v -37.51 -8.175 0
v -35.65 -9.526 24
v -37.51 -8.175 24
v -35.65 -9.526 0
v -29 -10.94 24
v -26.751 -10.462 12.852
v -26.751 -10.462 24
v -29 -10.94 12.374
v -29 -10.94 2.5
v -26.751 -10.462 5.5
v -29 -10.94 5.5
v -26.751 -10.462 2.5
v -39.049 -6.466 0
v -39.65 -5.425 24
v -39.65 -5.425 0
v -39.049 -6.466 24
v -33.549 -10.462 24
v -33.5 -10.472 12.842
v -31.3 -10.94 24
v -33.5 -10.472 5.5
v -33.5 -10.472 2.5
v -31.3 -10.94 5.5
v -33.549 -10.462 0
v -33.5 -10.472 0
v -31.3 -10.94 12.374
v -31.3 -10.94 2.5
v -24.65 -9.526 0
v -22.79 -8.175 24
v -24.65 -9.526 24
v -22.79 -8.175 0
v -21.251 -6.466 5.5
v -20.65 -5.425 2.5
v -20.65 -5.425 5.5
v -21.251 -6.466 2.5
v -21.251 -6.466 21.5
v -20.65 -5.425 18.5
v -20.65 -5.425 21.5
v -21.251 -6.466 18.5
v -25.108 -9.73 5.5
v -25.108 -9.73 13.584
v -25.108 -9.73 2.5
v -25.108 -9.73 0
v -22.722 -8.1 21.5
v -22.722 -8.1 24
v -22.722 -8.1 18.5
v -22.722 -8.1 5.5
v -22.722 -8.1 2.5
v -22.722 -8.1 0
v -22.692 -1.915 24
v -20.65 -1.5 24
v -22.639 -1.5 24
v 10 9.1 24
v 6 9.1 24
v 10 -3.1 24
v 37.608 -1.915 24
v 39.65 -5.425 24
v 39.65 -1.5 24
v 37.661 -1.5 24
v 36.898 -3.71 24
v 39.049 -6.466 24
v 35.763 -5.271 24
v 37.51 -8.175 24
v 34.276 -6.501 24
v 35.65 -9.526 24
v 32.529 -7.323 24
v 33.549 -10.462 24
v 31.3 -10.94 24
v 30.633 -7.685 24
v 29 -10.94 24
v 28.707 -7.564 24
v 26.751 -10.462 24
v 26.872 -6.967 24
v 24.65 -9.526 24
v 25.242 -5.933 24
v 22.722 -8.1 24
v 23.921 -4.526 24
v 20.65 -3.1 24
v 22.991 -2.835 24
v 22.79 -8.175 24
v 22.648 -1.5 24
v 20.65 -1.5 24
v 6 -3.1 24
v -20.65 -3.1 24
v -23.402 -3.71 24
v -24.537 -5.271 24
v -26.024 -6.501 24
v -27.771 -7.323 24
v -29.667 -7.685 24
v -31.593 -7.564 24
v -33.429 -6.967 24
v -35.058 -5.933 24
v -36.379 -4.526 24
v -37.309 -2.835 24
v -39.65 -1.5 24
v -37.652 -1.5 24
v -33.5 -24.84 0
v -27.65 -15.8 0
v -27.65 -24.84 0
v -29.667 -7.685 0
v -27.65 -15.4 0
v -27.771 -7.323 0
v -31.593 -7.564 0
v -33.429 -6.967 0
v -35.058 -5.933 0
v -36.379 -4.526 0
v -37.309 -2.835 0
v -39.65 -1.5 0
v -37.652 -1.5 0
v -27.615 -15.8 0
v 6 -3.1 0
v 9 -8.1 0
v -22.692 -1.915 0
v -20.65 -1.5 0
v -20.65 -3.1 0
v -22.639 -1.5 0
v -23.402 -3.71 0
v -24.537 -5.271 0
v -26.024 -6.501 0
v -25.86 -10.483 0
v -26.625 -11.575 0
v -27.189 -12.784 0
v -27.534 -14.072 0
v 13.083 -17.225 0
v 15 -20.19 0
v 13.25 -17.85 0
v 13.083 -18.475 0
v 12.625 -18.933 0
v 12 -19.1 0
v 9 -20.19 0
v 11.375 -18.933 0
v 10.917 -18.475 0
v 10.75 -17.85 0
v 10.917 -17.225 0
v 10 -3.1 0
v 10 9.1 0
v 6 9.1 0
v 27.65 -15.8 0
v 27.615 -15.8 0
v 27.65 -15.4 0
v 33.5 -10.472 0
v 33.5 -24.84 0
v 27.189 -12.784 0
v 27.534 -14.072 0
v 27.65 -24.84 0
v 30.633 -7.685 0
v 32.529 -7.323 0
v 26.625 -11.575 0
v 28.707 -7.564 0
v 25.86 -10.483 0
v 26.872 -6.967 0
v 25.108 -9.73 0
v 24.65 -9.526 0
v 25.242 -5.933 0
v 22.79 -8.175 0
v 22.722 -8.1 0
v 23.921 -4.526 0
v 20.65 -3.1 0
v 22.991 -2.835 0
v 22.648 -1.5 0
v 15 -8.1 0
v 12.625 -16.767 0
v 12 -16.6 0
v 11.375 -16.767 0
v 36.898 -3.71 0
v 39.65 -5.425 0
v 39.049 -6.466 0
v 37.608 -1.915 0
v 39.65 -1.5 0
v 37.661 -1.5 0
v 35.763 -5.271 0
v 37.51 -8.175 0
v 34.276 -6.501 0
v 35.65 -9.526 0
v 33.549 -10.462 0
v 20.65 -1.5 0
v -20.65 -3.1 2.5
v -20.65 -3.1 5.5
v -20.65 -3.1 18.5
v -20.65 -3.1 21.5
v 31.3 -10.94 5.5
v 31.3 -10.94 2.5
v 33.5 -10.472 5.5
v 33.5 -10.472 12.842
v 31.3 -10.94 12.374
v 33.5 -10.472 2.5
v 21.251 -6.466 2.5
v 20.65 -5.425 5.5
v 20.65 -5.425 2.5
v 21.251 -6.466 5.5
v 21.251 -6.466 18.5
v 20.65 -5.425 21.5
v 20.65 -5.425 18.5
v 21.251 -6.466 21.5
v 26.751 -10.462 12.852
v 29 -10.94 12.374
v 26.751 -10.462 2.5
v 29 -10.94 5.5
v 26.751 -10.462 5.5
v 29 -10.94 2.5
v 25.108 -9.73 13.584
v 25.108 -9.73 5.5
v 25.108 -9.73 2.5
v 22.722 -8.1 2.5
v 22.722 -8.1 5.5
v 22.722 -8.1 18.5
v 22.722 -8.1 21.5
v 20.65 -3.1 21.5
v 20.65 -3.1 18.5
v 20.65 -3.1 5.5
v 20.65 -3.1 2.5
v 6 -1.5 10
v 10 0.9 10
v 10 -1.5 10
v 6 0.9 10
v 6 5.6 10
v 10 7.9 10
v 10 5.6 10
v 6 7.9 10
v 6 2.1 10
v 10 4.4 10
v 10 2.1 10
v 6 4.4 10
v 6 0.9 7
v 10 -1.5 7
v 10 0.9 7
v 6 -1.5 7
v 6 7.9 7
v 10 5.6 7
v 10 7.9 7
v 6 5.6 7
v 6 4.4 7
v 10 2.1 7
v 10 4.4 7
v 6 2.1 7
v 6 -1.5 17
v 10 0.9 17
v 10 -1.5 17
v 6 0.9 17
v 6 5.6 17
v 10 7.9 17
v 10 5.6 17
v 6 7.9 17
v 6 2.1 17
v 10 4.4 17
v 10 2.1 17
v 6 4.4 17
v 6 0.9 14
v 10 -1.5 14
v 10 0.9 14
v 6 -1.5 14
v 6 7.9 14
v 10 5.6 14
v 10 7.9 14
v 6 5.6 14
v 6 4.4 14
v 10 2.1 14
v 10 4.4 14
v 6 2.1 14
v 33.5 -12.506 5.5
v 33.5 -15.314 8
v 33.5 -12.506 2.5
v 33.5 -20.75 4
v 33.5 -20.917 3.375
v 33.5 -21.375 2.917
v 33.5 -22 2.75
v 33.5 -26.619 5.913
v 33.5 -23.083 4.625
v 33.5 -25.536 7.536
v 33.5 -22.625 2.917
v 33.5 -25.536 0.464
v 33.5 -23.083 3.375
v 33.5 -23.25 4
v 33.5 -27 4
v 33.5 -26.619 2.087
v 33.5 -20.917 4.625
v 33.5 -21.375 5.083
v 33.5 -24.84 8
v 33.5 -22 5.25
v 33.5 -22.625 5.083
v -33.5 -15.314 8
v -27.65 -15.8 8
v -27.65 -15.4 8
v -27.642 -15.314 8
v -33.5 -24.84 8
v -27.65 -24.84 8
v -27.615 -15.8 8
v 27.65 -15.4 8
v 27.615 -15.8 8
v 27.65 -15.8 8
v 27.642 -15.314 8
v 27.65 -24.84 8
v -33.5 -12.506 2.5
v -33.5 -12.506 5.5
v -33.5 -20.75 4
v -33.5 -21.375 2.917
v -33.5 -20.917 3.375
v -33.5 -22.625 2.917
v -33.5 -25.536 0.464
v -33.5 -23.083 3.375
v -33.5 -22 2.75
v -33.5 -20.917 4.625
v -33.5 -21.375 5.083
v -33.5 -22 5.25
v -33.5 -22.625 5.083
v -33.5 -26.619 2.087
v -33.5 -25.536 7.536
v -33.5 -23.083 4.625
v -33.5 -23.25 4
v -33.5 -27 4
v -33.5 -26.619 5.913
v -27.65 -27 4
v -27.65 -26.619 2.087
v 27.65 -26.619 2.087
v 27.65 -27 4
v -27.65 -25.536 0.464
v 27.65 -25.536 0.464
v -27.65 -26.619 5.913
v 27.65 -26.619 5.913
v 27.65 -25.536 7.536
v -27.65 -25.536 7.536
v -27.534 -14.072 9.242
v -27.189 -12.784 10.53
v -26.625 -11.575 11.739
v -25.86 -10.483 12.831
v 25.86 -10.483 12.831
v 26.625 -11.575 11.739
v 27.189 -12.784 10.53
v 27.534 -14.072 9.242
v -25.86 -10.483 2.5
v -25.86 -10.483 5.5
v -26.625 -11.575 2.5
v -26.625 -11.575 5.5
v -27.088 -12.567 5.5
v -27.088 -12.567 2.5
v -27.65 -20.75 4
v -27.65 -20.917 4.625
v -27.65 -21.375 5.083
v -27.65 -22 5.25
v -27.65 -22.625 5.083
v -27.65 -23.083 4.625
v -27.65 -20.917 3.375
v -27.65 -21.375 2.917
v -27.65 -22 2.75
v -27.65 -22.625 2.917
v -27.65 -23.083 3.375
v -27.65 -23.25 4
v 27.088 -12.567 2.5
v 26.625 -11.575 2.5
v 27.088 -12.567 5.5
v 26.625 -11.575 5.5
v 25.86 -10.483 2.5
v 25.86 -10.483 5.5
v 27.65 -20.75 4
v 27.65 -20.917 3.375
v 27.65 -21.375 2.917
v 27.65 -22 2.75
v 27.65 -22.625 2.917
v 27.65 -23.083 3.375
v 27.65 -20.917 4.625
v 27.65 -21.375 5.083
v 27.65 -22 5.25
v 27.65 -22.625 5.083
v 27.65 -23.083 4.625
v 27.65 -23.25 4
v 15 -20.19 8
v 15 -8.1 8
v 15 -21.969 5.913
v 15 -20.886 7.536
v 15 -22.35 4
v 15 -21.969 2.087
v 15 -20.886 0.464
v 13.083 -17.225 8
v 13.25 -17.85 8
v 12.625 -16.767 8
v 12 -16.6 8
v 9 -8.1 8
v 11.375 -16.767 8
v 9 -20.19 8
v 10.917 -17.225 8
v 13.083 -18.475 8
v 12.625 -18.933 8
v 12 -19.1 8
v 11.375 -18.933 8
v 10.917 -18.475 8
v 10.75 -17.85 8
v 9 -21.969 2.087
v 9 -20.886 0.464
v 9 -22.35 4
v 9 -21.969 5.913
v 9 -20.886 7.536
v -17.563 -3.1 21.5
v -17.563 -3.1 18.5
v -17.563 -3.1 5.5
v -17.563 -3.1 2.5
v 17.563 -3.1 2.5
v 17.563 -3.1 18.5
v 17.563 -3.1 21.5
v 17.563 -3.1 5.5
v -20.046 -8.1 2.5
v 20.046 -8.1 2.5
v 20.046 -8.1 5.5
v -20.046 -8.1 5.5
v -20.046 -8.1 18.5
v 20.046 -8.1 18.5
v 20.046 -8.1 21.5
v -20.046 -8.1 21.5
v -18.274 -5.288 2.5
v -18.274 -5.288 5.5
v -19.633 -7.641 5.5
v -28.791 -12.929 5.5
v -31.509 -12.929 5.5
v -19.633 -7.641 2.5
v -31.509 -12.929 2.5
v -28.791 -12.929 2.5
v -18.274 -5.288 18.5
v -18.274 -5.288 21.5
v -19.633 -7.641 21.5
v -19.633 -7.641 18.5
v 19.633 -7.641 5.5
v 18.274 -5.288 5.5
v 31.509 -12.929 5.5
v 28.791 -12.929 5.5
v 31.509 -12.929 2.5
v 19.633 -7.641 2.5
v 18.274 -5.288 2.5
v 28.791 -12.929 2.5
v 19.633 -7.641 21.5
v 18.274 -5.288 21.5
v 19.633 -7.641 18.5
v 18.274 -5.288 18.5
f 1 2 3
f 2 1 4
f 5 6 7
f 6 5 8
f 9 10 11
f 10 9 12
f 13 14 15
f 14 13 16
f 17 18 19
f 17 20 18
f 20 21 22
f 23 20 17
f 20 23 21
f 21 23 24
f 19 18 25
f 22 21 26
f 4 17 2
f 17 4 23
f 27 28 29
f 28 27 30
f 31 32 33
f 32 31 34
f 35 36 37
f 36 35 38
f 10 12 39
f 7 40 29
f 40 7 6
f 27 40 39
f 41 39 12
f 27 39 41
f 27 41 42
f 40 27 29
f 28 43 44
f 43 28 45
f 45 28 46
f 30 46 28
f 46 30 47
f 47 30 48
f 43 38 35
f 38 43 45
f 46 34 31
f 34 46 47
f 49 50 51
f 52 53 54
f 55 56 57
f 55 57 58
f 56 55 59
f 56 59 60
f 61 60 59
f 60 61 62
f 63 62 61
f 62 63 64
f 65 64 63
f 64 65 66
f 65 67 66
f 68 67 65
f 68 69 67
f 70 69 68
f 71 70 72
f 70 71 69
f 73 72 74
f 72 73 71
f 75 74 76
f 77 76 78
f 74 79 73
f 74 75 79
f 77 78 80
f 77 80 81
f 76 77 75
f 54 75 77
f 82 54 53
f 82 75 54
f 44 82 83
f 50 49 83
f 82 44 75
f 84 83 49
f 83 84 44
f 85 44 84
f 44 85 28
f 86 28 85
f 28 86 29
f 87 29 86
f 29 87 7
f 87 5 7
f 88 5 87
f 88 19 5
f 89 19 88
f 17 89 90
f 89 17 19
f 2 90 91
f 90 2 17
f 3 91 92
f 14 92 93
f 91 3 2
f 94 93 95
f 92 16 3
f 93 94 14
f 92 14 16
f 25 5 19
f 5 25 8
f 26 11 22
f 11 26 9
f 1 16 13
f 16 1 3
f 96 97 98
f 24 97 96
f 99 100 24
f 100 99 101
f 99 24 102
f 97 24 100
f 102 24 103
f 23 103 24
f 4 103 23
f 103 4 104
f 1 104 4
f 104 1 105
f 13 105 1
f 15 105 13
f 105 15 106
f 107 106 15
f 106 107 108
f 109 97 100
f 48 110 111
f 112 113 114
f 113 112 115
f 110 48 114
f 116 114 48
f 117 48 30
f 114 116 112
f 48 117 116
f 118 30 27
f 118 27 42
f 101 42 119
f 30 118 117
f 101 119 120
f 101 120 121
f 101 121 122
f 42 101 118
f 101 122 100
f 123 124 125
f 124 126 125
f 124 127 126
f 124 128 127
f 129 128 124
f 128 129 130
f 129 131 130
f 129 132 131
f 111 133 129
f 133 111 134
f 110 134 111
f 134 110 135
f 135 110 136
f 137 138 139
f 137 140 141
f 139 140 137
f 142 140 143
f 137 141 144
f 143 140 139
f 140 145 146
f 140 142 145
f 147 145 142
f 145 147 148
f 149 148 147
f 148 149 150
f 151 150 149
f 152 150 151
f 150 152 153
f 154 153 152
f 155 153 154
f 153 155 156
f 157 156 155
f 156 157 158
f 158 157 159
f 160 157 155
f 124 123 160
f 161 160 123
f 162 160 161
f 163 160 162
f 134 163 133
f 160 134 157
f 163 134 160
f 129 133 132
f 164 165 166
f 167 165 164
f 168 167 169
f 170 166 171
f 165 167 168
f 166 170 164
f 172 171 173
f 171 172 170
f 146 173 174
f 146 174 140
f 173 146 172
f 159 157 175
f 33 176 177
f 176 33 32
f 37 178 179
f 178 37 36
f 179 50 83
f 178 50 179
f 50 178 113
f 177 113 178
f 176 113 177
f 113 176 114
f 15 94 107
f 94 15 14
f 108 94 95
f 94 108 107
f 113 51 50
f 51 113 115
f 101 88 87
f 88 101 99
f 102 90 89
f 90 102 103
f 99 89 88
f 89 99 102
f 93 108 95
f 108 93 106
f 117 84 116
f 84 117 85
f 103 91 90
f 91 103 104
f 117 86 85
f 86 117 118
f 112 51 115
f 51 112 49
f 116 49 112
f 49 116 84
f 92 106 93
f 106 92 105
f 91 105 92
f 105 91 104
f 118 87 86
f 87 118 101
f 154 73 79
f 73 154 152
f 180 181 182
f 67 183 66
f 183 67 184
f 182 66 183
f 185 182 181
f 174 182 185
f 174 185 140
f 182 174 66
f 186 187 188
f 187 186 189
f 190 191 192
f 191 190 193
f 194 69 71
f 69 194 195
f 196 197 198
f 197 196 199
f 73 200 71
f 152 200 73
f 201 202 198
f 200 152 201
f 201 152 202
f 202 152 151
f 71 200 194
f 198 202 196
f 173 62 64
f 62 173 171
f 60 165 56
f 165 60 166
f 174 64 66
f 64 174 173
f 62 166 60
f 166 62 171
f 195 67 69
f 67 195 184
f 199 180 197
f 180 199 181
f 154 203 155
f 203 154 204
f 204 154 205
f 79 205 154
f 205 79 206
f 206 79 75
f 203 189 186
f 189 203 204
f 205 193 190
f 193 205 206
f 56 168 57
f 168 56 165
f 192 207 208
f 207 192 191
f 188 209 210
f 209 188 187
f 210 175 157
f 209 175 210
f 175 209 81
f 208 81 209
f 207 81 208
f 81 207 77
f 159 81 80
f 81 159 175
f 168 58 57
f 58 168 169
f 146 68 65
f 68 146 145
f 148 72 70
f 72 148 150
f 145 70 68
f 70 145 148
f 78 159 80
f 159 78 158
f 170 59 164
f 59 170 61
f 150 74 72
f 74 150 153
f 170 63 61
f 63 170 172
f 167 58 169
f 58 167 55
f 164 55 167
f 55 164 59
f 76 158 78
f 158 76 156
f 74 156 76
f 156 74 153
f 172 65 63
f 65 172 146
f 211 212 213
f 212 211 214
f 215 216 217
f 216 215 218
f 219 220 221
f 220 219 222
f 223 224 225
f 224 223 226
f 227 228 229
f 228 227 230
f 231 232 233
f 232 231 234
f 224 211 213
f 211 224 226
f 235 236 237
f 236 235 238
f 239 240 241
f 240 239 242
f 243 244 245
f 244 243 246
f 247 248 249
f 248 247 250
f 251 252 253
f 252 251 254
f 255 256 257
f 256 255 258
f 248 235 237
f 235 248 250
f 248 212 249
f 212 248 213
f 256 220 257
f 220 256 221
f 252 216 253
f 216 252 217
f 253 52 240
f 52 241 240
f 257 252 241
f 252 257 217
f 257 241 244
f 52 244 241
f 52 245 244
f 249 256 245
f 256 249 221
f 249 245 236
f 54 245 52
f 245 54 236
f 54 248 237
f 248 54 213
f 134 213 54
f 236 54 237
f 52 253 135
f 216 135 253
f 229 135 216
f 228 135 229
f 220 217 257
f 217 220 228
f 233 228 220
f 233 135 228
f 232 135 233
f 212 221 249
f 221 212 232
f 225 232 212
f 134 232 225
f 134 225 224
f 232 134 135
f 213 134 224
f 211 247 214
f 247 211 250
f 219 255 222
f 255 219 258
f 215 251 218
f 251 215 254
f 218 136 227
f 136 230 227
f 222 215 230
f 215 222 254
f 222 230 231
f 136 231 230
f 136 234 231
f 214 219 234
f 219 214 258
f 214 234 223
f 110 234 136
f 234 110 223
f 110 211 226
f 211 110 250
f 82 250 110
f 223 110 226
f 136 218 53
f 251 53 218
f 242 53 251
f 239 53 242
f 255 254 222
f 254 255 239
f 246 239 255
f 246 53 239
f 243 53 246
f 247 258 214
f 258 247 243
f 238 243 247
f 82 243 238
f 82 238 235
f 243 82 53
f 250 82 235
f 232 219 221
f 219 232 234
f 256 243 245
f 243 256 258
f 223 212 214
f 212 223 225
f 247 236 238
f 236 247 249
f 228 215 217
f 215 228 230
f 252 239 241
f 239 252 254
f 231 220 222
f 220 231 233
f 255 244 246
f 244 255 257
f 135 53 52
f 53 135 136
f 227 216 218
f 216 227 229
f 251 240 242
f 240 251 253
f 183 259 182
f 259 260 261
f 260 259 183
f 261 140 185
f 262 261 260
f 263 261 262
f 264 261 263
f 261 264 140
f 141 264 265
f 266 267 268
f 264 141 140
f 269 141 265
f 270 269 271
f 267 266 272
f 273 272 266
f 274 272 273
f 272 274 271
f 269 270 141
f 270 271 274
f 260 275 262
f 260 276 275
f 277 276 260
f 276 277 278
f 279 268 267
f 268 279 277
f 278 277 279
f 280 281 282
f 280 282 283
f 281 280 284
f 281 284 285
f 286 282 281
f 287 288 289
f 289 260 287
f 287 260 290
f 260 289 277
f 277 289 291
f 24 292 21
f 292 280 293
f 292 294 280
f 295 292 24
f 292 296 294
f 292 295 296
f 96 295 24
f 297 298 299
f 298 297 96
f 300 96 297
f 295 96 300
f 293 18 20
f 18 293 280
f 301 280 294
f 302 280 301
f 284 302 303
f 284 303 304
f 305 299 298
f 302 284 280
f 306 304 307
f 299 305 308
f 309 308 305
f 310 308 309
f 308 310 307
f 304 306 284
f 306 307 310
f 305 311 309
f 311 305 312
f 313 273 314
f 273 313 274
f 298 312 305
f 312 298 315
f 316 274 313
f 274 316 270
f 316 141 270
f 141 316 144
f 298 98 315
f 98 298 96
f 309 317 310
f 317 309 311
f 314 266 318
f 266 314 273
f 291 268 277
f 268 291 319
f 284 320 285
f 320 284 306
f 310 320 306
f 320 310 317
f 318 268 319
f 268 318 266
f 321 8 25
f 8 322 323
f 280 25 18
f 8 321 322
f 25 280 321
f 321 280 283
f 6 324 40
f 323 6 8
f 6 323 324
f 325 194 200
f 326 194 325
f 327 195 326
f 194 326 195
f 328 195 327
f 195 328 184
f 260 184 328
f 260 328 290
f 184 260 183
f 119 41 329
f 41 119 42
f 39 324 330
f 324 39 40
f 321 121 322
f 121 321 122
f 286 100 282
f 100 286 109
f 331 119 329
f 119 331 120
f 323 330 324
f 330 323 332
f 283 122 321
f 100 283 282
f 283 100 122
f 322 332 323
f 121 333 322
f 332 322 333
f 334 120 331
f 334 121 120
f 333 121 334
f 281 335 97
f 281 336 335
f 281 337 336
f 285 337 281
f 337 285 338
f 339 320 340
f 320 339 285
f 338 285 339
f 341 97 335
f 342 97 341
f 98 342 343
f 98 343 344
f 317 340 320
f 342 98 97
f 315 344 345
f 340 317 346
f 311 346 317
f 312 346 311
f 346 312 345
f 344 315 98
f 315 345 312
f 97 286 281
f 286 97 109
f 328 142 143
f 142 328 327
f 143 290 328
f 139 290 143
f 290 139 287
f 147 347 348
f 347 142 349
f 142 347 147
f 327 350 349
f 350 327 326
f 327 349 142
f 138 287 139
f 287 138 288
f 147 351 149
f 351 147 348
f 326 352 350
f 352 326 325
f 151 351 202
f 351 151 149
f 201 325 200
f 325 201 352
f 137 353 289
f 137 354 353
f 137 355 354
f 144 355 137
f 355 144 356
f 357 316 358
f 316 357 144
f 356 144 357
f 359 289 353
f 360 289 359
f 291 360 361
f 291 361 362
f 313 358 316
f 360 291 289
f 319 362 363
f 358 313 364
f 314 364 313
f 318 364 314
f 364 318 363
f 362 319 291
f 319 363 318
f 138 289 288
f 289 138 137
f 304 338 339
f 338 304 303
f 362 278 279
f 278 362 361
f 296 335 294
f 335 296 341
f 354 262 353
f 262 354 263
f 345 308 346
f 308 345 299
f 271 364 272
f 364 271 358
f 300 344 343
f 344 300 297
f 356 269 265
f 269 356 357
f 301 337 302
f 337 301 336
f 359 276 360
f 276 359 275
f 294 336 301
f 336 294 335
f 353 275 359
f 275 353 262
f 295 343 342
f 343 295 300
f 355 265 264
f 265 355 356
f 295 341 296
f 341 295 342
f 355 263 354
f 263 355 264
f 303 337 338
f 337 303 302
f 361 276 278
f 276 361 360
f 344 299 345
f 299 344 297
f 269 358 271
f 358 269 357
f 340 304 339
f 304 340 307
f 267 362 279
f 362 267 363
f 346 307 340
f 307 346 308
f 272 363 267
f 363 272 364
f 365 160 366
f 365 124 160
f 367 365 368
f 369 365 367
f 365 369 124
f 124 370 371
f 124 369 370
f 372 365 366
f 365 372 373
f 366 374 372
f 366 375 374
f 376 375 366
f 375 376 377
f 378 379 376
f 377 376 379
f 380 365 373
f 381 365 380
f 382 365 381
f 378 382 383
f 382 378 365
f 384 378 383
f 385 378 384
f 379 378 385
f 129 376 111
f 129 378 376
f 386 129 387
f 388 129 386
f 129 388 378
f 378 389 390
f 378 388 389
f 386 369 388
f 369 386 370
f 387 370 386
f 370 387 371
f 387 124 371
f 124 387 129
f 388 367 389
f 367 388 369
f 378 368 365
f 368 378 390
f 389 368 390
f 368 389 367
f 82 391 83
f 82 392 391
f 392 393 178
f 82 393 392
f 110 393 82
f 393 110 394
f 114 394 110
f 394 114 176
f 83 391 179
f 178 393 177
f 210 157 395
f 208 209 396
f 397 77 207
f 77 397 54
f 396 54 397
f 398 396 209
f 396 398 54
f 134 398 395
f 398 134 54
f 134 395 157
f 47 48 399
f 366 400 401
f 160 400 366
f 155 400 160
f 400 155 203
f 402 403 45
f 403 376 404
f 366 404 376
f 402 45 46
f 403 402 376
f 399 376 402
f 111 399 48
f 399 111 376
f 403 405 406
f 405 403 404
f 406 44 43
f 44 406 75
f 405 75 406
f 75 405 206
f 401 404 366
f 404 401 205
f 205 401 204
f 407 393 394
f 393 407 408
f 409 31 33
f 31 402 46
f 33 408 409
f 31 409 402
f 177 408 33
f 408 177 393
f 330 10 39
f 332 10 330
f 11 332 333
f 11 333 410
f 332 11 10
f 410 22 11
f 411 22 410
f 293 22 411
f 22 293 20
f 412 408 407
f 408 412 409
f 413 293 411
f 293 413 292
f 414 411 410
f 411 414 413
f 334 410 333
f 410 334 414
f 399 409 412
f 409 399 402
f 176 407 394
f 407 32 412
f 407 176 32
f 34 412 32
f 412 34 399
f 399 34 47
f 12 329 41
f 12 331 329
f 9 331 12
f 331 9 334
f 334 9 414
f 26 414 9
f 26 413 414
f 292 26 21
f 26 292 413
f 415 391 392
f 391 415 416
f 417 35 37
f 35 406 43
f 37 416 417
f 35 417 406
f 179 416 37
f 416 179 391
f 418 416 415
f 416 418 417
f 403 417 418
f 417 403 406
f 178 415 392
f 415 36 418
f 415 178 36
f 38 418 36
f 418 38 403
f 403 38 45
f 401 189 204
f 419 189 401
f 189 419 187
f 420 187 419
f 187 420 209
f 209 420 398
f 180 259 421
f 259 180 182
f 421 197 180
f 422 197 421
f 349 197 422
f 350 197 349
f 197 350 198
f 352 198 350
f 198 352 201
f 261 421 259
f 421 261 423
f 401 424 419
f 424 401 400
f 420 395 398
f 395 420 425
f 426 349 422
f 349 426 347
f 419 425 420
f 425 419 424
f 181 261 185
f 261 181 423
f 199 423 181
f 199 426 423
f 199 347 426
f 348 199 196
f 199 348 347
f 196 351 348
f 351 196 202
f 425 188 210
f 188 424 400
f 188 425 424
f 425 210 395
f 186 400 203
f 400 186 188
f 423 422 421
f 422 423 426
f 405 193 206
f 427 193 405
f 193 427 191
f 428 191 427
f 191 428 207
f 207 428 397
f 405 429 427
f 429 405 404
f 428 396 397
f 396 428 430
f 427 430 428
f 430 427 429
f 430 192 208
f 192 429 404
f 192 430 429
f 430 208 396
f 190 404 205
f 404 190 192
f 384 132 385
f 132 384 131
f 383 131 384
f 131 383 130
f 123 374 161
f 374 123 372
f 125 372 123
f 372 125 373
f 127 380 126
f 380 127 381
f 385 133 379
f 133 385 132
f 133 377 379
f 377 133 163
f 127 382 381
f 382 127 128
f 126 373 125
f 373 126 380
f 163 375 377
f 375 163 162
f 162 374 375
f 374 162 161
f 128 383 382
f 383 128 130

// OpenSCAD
// file: configuration.scad
//
// PFCL25 motor extruder configration file
//

motor_end_height=44;
idler_end_height=28;
carriage_height=24;
platform_thickness=8;

sanguinololu=true;					// places mounting holes for the Sanguinololu controller
carbon_rods=true;					// turns on option for carbon diagonal rods just for looks!

frame_thickness=6;   				// 6mm acrylic
pcb_thickness=2;						// used for rendering PCB and approximating build volume

smooth_rod_length=495;  				// determins vertical build height with 508 for 8" 
rod_diameter=8;						// might be interesting to have larger rods
platform_hinge_offset=33;
carriage_hinge_offset=22;

printbed=[155,155];  				// printrbed 6x6 -  210,210 for prusa 8x8 platform
printbed_screw_spacing=[146.5,147]; 	// sets screw spacing for heated bed default: printrbed

tower_radius = printbed[0]*0.9;
rod_length=printbed[0]*1.2;

corner_radius=12;
frame_radius=(tower_radius-rod_diameter/2-corner_radius)/cos(30);
// main file
//
// PFCL25 motor extruder include file
//

include <configuration.scad>

width = 67;
height = carriage_height;

offset = 20;
cutout = 15+0.3;
middle = 2*offset - width/2;

module parallel_joints(reinforced) {
  difference() {
    union() {
      intersection() {
        cube([width, 20, 8], center=true);
        rotate([0, 90, 0]) cylinder(r=5, h=width, center=true);
      }
      intersection() {
        translate([0, 18, 4]) rotate([45, 0, 0])
          cube([width, reinforced, reinforced], center=true);
        translate([0, 0, 20]) cube([width, 35, 40], center=true);
      }
      translate([0, 8, 0]) cube([width, 16, 8], center=true);
    }
    rotate([0, 90, 0]) cylinder(r=1.25, h=80, center=true, $fn=12);

    for (x = [-offset, offset]) {
      translate([x, 6.6, 0])
        cylinder(r=cutout/2, h=100, center=true, $fn=36);
      translate([x, -3.8, 0])
        cube([cutout, 20, 100], center=true);
      //translate([x, 0, 0]) rotate([0, 90, 0]) rotate([0, 0, 30])
       // cylinder(r=3.3, h=19, center=true, $fn=6);
    }
    translate([0, 4, 0])
      cube([2*offset+7, 20, 100], center=true);
    //translate([0, 2, 0]) cylinder(r=middle, h=100, center=true);
    //translate([0, -8, 0]) cube([2*middle, 20, 100], center=true);
  }
}

module lm8uu_mount(d, h) {
  union() {
    difference() {
      intersection() {
        cylinder(r=11, h=h, center=true);
        translate([0, -8, 0]) cube([19, 13, h+1], center=true);
      }
      cylinder(r=d/2, h=h+1, center=true);
    }
  }
}

module belt_mount() {
  difference() {
    union() {
      difference() {
        translate([8, 2, 0]) cube([4, 13, height], center=true);
        for (z = [-3.5, 3.5])
          translate([8, 5, z])
            cube([5, 13, 3], center=true);
      }
      for (y = [1.5, 5, 8.5]) {
        translate([8, y, 0]) cube([4, 1.2, height], center=true);
      }
    }
  }
}

module carriage() {
  translate([0, 0, height/2]) 
  union() {
    for (x = [-30.15, 30.15]) {
      translate([x, 0, 0]) lm8uu_mount(d=15.4, h=24); // d=15 LM8UU
    }
    belt_mount();
    difference() {
      union() {
        translate([0, -5.6, 0])
          cube([50, 5, height], center=true);
        translate([0, -carriage_hinge_offset, -height/2+4])
          parallel_joints(16);
        // endstop column
        translate([15-3, -10-1.85, -height/2+4])
          cube([6, 10, 8], center=true);
        translate([15-3, -15.5-1.85, -height/2+4])
          intersection() {
            cube([6, 20, 8], center=true);
            rotate([0, 90, 0]) cylinder(r=5, h=6, center=true);
          }
      }
      // Screw hole for adjustable top endstop.
      translate([15-3, -16-1.85, -height/2+4])
        cylinder(r=1.25, h=20, center=true, $fn=12);
      for (x = [-30.15, 30.15]) {
        translate([x, 0, 0])
          cylinder(r=8, h=height+1, center=true);
        // Zip tie tunnels.
        for (z = [-height/2+4, height/2-4])
          translate([x, 0, z])
            cylinder(r=13, h=3, center=true);
      }
    }
  }
}

carriage();
//parallel_joints(0);

// Uncomment the following lines to check endstop alignment.
// use <idler_end.scad>;
// translate([0, 0, -20]) rotate([180, 0, 0]) idler_end();
